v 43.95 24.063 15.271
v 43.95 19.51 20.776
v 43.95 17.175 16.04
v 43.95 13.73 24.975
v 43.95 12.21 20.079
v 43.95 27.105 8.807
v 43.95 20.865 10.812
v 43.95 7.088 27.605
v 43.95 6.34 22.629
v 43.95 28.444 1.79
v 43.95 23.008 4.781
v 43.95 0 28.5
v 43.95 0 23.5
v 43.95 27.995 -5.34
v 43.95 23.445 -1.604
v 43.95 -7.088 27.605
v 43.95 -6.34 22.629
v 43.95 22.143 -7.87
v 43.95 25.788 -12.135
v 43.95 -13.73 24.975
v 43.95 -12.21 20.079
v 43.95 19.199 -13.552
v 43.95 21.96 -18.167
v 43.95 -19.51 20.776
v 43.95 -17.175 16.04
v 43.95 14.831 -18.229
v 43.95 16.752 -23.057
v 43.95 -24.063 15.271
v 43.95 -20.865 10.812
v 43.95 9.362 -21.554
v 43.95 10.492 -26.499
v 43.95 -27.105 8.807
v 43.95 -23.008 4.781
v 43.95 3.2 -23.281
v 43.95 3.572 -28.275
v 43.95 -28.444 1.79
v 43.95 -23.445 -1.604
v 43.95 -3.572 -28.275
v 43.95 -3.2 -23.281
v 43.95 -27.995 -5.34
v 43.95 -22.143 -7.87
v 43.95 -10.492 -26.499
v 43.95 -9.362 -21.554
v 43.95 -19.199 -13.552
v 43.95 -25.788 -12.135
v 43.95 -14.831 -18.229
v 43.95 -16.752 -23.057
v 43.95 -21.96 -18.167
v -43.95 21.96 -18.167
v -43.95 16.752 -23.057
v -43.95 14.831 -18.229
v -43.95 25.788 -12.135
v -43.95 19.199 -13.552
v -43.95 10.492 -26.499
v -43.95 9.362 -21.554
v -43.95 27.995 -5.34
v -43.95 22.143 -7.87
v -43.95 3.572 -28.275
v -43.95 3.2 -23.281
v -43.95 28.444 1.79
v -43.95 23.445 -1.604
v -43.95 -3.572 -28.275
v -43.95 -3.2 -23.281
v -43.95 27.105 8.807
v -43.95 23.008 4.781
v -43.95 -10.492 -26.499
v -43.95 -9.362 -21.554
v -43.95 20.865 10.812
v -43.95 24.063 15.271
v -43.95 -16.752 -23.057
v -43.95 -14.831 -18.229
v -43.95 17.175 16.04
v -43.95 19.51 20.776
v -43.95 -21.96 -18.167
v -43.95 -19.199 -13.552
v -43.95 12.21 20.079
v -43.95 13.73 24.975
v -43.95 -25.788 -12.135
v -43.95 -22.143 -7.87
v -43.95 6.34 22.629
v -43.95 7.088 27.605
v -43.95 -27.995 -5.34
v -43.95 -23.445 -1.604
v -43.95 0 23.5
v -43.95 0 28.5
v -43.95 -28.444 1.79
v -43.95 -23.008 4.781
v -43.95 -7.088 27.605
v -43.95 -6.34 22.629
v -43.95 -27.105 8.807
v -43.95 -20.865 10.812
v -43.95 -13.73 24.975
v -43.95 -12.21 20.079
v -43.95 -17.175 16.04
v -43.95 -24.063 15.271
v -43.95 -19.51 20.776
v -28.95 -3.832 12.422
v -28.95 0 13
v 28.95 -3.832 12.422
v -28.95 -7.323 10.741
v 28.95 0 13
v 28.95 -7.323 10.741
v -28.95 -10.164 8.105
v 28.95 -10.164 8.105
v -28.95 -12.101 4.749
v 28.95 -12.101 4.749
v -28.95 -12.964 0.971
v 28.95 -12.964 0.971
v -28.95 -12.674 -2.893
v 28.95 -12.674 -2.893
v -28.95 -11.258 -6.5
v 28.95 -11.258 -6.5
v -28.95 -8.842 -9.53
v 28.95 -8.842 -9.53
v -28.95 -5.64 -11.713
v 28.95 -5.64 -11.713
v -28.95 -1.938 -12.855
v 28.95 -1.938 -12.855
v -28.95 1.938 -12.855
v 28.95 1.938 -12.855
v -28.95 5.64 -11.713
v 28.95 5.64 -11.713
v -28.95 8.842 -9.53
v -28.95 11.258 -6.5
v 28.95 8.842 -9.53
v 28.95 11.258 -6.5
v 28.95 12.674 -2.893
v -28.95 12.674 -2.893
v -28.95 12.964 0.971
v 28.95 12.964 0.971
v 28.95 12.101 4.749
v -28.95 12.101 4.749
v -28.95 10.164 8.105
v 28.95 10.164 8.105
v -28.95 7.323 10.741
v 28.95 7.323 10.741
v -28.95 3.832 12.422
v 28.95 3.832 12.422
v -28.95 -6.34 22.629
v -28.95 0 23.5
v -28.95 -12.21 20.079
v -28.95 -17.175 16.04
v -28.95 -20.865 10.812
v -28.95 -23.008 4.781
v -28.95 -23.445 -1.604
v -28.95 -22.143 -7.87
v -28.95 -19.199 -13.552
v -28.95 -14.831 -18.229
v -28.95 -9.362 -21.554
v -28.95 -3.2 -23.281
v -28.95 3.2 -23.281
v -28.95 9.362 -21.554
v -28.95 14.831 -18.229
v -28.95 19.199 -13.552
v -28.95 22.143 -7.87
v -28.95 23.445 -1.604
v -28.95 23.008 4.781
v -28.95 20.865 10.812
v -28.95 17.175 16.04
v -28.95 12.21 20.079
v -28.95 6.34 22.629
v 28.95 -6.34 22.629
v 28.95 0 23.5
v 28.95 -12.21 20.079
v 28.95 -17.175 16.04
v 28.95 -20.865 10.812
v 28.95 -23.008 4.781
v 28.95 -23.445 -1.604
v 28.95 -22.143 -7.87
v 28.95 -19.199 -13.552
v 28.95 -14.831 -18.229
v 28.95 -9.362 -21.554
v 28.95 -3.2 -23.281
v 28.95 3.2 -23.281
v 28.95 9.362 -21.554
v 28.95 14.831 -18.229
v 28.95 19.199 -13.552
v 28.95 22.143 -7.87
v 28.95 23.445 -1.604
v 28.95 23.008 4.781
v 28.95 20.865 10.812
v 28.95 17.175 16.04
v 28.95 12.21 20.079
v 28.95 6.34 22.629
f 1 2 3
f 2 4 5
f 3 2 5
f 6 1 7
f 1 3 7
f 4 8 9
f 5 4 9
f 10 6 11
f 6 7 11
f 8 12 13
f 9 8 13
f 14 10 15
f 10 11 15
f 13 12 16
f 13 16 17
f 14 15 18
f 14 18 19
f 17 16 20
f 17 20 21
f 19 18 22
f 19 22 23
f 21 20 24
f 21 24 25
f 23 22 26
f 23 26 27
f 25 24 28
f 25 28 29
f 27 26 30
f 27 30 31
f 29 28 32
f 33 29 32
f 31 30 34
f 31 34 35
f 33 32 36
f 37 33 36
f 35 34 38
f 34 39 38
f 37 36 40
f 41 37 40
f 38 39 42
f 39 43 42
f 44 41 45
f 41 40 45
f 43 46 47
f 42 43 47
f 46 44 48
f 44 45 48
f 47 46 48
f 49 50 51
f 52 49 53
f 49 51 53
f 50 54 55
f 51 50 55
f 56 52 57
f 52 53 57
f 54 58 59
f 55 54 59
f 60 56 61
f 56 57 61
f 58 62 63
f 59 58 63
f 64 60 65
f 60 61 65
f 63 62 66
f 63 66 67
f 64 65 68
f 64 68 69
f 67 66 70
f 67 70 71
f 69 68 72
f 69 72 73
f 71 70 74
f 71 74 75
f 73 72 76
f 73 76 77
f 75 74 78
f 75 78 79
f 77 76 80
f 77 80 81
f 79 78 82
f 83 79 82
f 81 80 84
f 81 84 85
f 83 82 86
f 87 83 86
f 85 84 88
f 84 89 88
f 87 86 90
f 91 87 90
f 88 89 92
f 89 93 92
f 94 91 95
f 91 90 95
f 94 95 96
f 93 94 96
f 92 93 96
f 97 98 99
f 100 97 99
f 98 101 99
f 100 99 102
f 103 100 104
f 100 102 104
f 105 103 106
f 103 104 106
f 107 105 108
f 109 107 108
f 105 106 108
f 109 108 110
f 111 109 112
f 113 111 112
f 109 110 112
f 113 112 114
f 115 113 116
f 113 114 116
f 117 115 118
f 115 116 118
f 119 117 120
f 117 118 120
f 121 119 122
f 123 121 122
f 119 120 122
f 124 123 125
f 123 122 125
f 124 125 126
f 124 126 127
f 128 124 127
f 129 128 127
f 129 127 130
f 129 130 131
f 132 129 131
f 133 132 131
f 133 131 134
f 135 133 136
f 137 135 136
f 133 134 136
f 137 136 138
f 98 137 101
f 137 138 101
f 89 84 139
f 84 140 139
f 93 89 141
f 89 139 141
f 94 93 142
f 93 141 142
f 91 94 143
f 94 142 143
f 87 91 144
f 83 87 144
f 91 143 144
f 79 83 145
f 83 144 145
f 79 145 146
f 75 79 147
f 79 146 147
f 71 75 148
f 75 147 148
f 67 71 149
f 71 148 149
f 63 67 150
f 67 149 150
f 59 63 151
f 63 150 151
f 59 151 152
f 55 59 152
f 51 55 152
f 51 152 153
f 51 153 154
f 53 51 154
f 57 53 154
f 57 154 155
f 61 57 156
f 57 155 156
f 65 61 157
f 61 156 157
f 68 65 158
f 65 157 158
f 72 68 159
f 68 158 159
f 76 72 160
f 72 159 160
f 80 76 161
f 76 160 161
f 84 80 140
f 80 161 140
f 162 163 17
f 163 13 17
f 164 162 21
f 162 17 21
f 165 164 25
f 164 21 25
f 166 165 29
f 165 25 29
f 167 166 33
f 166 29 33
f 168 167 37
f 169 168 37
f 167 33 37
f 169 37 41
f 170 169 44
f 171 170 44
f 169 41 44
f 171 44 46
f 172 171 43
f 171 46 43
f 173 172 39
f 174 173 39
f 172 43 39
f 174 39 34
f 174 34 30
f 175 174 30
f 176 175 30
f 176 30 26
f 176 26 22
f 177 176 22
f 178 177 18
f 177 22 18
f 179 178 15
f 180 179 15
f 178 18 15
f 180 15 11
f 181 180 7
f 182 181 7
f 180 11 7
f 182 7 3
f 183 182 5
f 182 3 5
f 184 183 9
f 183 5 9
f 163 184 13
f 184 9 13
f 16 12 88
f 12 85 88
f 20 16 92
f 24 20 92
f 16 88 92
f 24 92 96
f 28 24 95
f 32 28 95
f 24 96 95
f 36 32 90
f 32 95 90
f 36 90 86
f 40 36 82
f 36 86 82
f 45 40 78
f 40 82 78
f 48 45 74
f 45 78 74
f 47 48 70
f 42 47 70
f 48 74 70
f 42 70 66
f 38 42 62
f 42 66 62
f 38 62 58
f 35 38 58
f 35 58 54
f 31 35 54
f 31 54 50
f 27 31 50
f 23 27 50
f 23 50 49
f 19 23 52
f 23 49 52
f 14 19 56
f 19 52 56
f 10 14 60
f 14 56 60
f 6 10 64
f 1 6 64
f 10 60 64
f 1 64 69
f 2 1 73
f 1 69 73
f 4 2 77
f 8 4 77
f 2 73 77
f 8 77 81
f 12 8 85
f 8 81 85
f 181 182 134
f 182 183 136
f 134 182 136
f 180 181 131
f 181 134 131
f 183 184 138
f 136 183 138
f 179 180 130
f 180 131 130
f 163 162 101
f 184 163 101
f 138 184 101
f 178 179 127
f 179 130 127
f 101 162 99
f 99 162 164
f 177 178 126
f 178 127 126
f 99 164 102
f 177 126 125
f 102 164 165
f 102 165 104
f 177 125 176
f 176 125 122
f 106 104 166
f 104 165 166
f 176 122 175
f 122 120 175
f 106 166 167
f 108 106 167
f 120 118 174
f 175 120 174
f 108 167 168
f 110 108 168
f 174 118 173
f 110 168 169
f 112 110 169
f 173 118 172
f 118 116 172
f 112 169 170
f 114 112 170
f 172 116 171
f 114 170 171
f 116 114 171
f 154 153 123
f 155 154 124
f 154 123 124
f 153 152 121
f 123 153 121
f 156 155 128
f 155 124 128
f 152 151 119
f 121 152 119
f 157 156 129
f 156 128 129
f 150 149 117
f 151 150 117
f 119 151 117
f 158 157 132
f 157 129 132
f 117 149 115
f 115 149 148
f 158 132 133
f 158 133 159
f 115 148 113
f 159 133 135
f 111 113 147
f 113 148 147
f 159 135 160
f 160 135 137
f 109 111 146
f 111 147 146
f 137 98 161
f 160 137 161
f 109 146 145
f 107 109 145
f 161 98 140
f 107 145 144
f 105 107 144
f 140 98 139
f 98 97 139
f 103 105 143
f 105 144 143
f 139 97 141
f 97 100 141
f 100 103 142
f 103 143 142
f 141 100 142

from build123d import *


with BuildPart() as part:
    # Esquisse1 → Révolution1 (revolve)
    with BuildSketch(Plane.XY, mode=Mode.PRIVATE) as r_volution1_sk:
        Polygon((28.95, 13), (28.95, 23.5), (43.95, 23.5), (43.95, 28.5), (-43.95, 28.5), (-43.95, 23.5), (-28.95, 23.5), (-28.95, 13), align=None)
    revolve(r_volution1_sk.sketch.rotate(Axis((-28.010573724, 0, 0), (1, 0, 0)), 90), axis=Axis((-28.010573724, 0, 0), (1, 0, 0)))  # turned: the seam where the file's is


solid = part.part
